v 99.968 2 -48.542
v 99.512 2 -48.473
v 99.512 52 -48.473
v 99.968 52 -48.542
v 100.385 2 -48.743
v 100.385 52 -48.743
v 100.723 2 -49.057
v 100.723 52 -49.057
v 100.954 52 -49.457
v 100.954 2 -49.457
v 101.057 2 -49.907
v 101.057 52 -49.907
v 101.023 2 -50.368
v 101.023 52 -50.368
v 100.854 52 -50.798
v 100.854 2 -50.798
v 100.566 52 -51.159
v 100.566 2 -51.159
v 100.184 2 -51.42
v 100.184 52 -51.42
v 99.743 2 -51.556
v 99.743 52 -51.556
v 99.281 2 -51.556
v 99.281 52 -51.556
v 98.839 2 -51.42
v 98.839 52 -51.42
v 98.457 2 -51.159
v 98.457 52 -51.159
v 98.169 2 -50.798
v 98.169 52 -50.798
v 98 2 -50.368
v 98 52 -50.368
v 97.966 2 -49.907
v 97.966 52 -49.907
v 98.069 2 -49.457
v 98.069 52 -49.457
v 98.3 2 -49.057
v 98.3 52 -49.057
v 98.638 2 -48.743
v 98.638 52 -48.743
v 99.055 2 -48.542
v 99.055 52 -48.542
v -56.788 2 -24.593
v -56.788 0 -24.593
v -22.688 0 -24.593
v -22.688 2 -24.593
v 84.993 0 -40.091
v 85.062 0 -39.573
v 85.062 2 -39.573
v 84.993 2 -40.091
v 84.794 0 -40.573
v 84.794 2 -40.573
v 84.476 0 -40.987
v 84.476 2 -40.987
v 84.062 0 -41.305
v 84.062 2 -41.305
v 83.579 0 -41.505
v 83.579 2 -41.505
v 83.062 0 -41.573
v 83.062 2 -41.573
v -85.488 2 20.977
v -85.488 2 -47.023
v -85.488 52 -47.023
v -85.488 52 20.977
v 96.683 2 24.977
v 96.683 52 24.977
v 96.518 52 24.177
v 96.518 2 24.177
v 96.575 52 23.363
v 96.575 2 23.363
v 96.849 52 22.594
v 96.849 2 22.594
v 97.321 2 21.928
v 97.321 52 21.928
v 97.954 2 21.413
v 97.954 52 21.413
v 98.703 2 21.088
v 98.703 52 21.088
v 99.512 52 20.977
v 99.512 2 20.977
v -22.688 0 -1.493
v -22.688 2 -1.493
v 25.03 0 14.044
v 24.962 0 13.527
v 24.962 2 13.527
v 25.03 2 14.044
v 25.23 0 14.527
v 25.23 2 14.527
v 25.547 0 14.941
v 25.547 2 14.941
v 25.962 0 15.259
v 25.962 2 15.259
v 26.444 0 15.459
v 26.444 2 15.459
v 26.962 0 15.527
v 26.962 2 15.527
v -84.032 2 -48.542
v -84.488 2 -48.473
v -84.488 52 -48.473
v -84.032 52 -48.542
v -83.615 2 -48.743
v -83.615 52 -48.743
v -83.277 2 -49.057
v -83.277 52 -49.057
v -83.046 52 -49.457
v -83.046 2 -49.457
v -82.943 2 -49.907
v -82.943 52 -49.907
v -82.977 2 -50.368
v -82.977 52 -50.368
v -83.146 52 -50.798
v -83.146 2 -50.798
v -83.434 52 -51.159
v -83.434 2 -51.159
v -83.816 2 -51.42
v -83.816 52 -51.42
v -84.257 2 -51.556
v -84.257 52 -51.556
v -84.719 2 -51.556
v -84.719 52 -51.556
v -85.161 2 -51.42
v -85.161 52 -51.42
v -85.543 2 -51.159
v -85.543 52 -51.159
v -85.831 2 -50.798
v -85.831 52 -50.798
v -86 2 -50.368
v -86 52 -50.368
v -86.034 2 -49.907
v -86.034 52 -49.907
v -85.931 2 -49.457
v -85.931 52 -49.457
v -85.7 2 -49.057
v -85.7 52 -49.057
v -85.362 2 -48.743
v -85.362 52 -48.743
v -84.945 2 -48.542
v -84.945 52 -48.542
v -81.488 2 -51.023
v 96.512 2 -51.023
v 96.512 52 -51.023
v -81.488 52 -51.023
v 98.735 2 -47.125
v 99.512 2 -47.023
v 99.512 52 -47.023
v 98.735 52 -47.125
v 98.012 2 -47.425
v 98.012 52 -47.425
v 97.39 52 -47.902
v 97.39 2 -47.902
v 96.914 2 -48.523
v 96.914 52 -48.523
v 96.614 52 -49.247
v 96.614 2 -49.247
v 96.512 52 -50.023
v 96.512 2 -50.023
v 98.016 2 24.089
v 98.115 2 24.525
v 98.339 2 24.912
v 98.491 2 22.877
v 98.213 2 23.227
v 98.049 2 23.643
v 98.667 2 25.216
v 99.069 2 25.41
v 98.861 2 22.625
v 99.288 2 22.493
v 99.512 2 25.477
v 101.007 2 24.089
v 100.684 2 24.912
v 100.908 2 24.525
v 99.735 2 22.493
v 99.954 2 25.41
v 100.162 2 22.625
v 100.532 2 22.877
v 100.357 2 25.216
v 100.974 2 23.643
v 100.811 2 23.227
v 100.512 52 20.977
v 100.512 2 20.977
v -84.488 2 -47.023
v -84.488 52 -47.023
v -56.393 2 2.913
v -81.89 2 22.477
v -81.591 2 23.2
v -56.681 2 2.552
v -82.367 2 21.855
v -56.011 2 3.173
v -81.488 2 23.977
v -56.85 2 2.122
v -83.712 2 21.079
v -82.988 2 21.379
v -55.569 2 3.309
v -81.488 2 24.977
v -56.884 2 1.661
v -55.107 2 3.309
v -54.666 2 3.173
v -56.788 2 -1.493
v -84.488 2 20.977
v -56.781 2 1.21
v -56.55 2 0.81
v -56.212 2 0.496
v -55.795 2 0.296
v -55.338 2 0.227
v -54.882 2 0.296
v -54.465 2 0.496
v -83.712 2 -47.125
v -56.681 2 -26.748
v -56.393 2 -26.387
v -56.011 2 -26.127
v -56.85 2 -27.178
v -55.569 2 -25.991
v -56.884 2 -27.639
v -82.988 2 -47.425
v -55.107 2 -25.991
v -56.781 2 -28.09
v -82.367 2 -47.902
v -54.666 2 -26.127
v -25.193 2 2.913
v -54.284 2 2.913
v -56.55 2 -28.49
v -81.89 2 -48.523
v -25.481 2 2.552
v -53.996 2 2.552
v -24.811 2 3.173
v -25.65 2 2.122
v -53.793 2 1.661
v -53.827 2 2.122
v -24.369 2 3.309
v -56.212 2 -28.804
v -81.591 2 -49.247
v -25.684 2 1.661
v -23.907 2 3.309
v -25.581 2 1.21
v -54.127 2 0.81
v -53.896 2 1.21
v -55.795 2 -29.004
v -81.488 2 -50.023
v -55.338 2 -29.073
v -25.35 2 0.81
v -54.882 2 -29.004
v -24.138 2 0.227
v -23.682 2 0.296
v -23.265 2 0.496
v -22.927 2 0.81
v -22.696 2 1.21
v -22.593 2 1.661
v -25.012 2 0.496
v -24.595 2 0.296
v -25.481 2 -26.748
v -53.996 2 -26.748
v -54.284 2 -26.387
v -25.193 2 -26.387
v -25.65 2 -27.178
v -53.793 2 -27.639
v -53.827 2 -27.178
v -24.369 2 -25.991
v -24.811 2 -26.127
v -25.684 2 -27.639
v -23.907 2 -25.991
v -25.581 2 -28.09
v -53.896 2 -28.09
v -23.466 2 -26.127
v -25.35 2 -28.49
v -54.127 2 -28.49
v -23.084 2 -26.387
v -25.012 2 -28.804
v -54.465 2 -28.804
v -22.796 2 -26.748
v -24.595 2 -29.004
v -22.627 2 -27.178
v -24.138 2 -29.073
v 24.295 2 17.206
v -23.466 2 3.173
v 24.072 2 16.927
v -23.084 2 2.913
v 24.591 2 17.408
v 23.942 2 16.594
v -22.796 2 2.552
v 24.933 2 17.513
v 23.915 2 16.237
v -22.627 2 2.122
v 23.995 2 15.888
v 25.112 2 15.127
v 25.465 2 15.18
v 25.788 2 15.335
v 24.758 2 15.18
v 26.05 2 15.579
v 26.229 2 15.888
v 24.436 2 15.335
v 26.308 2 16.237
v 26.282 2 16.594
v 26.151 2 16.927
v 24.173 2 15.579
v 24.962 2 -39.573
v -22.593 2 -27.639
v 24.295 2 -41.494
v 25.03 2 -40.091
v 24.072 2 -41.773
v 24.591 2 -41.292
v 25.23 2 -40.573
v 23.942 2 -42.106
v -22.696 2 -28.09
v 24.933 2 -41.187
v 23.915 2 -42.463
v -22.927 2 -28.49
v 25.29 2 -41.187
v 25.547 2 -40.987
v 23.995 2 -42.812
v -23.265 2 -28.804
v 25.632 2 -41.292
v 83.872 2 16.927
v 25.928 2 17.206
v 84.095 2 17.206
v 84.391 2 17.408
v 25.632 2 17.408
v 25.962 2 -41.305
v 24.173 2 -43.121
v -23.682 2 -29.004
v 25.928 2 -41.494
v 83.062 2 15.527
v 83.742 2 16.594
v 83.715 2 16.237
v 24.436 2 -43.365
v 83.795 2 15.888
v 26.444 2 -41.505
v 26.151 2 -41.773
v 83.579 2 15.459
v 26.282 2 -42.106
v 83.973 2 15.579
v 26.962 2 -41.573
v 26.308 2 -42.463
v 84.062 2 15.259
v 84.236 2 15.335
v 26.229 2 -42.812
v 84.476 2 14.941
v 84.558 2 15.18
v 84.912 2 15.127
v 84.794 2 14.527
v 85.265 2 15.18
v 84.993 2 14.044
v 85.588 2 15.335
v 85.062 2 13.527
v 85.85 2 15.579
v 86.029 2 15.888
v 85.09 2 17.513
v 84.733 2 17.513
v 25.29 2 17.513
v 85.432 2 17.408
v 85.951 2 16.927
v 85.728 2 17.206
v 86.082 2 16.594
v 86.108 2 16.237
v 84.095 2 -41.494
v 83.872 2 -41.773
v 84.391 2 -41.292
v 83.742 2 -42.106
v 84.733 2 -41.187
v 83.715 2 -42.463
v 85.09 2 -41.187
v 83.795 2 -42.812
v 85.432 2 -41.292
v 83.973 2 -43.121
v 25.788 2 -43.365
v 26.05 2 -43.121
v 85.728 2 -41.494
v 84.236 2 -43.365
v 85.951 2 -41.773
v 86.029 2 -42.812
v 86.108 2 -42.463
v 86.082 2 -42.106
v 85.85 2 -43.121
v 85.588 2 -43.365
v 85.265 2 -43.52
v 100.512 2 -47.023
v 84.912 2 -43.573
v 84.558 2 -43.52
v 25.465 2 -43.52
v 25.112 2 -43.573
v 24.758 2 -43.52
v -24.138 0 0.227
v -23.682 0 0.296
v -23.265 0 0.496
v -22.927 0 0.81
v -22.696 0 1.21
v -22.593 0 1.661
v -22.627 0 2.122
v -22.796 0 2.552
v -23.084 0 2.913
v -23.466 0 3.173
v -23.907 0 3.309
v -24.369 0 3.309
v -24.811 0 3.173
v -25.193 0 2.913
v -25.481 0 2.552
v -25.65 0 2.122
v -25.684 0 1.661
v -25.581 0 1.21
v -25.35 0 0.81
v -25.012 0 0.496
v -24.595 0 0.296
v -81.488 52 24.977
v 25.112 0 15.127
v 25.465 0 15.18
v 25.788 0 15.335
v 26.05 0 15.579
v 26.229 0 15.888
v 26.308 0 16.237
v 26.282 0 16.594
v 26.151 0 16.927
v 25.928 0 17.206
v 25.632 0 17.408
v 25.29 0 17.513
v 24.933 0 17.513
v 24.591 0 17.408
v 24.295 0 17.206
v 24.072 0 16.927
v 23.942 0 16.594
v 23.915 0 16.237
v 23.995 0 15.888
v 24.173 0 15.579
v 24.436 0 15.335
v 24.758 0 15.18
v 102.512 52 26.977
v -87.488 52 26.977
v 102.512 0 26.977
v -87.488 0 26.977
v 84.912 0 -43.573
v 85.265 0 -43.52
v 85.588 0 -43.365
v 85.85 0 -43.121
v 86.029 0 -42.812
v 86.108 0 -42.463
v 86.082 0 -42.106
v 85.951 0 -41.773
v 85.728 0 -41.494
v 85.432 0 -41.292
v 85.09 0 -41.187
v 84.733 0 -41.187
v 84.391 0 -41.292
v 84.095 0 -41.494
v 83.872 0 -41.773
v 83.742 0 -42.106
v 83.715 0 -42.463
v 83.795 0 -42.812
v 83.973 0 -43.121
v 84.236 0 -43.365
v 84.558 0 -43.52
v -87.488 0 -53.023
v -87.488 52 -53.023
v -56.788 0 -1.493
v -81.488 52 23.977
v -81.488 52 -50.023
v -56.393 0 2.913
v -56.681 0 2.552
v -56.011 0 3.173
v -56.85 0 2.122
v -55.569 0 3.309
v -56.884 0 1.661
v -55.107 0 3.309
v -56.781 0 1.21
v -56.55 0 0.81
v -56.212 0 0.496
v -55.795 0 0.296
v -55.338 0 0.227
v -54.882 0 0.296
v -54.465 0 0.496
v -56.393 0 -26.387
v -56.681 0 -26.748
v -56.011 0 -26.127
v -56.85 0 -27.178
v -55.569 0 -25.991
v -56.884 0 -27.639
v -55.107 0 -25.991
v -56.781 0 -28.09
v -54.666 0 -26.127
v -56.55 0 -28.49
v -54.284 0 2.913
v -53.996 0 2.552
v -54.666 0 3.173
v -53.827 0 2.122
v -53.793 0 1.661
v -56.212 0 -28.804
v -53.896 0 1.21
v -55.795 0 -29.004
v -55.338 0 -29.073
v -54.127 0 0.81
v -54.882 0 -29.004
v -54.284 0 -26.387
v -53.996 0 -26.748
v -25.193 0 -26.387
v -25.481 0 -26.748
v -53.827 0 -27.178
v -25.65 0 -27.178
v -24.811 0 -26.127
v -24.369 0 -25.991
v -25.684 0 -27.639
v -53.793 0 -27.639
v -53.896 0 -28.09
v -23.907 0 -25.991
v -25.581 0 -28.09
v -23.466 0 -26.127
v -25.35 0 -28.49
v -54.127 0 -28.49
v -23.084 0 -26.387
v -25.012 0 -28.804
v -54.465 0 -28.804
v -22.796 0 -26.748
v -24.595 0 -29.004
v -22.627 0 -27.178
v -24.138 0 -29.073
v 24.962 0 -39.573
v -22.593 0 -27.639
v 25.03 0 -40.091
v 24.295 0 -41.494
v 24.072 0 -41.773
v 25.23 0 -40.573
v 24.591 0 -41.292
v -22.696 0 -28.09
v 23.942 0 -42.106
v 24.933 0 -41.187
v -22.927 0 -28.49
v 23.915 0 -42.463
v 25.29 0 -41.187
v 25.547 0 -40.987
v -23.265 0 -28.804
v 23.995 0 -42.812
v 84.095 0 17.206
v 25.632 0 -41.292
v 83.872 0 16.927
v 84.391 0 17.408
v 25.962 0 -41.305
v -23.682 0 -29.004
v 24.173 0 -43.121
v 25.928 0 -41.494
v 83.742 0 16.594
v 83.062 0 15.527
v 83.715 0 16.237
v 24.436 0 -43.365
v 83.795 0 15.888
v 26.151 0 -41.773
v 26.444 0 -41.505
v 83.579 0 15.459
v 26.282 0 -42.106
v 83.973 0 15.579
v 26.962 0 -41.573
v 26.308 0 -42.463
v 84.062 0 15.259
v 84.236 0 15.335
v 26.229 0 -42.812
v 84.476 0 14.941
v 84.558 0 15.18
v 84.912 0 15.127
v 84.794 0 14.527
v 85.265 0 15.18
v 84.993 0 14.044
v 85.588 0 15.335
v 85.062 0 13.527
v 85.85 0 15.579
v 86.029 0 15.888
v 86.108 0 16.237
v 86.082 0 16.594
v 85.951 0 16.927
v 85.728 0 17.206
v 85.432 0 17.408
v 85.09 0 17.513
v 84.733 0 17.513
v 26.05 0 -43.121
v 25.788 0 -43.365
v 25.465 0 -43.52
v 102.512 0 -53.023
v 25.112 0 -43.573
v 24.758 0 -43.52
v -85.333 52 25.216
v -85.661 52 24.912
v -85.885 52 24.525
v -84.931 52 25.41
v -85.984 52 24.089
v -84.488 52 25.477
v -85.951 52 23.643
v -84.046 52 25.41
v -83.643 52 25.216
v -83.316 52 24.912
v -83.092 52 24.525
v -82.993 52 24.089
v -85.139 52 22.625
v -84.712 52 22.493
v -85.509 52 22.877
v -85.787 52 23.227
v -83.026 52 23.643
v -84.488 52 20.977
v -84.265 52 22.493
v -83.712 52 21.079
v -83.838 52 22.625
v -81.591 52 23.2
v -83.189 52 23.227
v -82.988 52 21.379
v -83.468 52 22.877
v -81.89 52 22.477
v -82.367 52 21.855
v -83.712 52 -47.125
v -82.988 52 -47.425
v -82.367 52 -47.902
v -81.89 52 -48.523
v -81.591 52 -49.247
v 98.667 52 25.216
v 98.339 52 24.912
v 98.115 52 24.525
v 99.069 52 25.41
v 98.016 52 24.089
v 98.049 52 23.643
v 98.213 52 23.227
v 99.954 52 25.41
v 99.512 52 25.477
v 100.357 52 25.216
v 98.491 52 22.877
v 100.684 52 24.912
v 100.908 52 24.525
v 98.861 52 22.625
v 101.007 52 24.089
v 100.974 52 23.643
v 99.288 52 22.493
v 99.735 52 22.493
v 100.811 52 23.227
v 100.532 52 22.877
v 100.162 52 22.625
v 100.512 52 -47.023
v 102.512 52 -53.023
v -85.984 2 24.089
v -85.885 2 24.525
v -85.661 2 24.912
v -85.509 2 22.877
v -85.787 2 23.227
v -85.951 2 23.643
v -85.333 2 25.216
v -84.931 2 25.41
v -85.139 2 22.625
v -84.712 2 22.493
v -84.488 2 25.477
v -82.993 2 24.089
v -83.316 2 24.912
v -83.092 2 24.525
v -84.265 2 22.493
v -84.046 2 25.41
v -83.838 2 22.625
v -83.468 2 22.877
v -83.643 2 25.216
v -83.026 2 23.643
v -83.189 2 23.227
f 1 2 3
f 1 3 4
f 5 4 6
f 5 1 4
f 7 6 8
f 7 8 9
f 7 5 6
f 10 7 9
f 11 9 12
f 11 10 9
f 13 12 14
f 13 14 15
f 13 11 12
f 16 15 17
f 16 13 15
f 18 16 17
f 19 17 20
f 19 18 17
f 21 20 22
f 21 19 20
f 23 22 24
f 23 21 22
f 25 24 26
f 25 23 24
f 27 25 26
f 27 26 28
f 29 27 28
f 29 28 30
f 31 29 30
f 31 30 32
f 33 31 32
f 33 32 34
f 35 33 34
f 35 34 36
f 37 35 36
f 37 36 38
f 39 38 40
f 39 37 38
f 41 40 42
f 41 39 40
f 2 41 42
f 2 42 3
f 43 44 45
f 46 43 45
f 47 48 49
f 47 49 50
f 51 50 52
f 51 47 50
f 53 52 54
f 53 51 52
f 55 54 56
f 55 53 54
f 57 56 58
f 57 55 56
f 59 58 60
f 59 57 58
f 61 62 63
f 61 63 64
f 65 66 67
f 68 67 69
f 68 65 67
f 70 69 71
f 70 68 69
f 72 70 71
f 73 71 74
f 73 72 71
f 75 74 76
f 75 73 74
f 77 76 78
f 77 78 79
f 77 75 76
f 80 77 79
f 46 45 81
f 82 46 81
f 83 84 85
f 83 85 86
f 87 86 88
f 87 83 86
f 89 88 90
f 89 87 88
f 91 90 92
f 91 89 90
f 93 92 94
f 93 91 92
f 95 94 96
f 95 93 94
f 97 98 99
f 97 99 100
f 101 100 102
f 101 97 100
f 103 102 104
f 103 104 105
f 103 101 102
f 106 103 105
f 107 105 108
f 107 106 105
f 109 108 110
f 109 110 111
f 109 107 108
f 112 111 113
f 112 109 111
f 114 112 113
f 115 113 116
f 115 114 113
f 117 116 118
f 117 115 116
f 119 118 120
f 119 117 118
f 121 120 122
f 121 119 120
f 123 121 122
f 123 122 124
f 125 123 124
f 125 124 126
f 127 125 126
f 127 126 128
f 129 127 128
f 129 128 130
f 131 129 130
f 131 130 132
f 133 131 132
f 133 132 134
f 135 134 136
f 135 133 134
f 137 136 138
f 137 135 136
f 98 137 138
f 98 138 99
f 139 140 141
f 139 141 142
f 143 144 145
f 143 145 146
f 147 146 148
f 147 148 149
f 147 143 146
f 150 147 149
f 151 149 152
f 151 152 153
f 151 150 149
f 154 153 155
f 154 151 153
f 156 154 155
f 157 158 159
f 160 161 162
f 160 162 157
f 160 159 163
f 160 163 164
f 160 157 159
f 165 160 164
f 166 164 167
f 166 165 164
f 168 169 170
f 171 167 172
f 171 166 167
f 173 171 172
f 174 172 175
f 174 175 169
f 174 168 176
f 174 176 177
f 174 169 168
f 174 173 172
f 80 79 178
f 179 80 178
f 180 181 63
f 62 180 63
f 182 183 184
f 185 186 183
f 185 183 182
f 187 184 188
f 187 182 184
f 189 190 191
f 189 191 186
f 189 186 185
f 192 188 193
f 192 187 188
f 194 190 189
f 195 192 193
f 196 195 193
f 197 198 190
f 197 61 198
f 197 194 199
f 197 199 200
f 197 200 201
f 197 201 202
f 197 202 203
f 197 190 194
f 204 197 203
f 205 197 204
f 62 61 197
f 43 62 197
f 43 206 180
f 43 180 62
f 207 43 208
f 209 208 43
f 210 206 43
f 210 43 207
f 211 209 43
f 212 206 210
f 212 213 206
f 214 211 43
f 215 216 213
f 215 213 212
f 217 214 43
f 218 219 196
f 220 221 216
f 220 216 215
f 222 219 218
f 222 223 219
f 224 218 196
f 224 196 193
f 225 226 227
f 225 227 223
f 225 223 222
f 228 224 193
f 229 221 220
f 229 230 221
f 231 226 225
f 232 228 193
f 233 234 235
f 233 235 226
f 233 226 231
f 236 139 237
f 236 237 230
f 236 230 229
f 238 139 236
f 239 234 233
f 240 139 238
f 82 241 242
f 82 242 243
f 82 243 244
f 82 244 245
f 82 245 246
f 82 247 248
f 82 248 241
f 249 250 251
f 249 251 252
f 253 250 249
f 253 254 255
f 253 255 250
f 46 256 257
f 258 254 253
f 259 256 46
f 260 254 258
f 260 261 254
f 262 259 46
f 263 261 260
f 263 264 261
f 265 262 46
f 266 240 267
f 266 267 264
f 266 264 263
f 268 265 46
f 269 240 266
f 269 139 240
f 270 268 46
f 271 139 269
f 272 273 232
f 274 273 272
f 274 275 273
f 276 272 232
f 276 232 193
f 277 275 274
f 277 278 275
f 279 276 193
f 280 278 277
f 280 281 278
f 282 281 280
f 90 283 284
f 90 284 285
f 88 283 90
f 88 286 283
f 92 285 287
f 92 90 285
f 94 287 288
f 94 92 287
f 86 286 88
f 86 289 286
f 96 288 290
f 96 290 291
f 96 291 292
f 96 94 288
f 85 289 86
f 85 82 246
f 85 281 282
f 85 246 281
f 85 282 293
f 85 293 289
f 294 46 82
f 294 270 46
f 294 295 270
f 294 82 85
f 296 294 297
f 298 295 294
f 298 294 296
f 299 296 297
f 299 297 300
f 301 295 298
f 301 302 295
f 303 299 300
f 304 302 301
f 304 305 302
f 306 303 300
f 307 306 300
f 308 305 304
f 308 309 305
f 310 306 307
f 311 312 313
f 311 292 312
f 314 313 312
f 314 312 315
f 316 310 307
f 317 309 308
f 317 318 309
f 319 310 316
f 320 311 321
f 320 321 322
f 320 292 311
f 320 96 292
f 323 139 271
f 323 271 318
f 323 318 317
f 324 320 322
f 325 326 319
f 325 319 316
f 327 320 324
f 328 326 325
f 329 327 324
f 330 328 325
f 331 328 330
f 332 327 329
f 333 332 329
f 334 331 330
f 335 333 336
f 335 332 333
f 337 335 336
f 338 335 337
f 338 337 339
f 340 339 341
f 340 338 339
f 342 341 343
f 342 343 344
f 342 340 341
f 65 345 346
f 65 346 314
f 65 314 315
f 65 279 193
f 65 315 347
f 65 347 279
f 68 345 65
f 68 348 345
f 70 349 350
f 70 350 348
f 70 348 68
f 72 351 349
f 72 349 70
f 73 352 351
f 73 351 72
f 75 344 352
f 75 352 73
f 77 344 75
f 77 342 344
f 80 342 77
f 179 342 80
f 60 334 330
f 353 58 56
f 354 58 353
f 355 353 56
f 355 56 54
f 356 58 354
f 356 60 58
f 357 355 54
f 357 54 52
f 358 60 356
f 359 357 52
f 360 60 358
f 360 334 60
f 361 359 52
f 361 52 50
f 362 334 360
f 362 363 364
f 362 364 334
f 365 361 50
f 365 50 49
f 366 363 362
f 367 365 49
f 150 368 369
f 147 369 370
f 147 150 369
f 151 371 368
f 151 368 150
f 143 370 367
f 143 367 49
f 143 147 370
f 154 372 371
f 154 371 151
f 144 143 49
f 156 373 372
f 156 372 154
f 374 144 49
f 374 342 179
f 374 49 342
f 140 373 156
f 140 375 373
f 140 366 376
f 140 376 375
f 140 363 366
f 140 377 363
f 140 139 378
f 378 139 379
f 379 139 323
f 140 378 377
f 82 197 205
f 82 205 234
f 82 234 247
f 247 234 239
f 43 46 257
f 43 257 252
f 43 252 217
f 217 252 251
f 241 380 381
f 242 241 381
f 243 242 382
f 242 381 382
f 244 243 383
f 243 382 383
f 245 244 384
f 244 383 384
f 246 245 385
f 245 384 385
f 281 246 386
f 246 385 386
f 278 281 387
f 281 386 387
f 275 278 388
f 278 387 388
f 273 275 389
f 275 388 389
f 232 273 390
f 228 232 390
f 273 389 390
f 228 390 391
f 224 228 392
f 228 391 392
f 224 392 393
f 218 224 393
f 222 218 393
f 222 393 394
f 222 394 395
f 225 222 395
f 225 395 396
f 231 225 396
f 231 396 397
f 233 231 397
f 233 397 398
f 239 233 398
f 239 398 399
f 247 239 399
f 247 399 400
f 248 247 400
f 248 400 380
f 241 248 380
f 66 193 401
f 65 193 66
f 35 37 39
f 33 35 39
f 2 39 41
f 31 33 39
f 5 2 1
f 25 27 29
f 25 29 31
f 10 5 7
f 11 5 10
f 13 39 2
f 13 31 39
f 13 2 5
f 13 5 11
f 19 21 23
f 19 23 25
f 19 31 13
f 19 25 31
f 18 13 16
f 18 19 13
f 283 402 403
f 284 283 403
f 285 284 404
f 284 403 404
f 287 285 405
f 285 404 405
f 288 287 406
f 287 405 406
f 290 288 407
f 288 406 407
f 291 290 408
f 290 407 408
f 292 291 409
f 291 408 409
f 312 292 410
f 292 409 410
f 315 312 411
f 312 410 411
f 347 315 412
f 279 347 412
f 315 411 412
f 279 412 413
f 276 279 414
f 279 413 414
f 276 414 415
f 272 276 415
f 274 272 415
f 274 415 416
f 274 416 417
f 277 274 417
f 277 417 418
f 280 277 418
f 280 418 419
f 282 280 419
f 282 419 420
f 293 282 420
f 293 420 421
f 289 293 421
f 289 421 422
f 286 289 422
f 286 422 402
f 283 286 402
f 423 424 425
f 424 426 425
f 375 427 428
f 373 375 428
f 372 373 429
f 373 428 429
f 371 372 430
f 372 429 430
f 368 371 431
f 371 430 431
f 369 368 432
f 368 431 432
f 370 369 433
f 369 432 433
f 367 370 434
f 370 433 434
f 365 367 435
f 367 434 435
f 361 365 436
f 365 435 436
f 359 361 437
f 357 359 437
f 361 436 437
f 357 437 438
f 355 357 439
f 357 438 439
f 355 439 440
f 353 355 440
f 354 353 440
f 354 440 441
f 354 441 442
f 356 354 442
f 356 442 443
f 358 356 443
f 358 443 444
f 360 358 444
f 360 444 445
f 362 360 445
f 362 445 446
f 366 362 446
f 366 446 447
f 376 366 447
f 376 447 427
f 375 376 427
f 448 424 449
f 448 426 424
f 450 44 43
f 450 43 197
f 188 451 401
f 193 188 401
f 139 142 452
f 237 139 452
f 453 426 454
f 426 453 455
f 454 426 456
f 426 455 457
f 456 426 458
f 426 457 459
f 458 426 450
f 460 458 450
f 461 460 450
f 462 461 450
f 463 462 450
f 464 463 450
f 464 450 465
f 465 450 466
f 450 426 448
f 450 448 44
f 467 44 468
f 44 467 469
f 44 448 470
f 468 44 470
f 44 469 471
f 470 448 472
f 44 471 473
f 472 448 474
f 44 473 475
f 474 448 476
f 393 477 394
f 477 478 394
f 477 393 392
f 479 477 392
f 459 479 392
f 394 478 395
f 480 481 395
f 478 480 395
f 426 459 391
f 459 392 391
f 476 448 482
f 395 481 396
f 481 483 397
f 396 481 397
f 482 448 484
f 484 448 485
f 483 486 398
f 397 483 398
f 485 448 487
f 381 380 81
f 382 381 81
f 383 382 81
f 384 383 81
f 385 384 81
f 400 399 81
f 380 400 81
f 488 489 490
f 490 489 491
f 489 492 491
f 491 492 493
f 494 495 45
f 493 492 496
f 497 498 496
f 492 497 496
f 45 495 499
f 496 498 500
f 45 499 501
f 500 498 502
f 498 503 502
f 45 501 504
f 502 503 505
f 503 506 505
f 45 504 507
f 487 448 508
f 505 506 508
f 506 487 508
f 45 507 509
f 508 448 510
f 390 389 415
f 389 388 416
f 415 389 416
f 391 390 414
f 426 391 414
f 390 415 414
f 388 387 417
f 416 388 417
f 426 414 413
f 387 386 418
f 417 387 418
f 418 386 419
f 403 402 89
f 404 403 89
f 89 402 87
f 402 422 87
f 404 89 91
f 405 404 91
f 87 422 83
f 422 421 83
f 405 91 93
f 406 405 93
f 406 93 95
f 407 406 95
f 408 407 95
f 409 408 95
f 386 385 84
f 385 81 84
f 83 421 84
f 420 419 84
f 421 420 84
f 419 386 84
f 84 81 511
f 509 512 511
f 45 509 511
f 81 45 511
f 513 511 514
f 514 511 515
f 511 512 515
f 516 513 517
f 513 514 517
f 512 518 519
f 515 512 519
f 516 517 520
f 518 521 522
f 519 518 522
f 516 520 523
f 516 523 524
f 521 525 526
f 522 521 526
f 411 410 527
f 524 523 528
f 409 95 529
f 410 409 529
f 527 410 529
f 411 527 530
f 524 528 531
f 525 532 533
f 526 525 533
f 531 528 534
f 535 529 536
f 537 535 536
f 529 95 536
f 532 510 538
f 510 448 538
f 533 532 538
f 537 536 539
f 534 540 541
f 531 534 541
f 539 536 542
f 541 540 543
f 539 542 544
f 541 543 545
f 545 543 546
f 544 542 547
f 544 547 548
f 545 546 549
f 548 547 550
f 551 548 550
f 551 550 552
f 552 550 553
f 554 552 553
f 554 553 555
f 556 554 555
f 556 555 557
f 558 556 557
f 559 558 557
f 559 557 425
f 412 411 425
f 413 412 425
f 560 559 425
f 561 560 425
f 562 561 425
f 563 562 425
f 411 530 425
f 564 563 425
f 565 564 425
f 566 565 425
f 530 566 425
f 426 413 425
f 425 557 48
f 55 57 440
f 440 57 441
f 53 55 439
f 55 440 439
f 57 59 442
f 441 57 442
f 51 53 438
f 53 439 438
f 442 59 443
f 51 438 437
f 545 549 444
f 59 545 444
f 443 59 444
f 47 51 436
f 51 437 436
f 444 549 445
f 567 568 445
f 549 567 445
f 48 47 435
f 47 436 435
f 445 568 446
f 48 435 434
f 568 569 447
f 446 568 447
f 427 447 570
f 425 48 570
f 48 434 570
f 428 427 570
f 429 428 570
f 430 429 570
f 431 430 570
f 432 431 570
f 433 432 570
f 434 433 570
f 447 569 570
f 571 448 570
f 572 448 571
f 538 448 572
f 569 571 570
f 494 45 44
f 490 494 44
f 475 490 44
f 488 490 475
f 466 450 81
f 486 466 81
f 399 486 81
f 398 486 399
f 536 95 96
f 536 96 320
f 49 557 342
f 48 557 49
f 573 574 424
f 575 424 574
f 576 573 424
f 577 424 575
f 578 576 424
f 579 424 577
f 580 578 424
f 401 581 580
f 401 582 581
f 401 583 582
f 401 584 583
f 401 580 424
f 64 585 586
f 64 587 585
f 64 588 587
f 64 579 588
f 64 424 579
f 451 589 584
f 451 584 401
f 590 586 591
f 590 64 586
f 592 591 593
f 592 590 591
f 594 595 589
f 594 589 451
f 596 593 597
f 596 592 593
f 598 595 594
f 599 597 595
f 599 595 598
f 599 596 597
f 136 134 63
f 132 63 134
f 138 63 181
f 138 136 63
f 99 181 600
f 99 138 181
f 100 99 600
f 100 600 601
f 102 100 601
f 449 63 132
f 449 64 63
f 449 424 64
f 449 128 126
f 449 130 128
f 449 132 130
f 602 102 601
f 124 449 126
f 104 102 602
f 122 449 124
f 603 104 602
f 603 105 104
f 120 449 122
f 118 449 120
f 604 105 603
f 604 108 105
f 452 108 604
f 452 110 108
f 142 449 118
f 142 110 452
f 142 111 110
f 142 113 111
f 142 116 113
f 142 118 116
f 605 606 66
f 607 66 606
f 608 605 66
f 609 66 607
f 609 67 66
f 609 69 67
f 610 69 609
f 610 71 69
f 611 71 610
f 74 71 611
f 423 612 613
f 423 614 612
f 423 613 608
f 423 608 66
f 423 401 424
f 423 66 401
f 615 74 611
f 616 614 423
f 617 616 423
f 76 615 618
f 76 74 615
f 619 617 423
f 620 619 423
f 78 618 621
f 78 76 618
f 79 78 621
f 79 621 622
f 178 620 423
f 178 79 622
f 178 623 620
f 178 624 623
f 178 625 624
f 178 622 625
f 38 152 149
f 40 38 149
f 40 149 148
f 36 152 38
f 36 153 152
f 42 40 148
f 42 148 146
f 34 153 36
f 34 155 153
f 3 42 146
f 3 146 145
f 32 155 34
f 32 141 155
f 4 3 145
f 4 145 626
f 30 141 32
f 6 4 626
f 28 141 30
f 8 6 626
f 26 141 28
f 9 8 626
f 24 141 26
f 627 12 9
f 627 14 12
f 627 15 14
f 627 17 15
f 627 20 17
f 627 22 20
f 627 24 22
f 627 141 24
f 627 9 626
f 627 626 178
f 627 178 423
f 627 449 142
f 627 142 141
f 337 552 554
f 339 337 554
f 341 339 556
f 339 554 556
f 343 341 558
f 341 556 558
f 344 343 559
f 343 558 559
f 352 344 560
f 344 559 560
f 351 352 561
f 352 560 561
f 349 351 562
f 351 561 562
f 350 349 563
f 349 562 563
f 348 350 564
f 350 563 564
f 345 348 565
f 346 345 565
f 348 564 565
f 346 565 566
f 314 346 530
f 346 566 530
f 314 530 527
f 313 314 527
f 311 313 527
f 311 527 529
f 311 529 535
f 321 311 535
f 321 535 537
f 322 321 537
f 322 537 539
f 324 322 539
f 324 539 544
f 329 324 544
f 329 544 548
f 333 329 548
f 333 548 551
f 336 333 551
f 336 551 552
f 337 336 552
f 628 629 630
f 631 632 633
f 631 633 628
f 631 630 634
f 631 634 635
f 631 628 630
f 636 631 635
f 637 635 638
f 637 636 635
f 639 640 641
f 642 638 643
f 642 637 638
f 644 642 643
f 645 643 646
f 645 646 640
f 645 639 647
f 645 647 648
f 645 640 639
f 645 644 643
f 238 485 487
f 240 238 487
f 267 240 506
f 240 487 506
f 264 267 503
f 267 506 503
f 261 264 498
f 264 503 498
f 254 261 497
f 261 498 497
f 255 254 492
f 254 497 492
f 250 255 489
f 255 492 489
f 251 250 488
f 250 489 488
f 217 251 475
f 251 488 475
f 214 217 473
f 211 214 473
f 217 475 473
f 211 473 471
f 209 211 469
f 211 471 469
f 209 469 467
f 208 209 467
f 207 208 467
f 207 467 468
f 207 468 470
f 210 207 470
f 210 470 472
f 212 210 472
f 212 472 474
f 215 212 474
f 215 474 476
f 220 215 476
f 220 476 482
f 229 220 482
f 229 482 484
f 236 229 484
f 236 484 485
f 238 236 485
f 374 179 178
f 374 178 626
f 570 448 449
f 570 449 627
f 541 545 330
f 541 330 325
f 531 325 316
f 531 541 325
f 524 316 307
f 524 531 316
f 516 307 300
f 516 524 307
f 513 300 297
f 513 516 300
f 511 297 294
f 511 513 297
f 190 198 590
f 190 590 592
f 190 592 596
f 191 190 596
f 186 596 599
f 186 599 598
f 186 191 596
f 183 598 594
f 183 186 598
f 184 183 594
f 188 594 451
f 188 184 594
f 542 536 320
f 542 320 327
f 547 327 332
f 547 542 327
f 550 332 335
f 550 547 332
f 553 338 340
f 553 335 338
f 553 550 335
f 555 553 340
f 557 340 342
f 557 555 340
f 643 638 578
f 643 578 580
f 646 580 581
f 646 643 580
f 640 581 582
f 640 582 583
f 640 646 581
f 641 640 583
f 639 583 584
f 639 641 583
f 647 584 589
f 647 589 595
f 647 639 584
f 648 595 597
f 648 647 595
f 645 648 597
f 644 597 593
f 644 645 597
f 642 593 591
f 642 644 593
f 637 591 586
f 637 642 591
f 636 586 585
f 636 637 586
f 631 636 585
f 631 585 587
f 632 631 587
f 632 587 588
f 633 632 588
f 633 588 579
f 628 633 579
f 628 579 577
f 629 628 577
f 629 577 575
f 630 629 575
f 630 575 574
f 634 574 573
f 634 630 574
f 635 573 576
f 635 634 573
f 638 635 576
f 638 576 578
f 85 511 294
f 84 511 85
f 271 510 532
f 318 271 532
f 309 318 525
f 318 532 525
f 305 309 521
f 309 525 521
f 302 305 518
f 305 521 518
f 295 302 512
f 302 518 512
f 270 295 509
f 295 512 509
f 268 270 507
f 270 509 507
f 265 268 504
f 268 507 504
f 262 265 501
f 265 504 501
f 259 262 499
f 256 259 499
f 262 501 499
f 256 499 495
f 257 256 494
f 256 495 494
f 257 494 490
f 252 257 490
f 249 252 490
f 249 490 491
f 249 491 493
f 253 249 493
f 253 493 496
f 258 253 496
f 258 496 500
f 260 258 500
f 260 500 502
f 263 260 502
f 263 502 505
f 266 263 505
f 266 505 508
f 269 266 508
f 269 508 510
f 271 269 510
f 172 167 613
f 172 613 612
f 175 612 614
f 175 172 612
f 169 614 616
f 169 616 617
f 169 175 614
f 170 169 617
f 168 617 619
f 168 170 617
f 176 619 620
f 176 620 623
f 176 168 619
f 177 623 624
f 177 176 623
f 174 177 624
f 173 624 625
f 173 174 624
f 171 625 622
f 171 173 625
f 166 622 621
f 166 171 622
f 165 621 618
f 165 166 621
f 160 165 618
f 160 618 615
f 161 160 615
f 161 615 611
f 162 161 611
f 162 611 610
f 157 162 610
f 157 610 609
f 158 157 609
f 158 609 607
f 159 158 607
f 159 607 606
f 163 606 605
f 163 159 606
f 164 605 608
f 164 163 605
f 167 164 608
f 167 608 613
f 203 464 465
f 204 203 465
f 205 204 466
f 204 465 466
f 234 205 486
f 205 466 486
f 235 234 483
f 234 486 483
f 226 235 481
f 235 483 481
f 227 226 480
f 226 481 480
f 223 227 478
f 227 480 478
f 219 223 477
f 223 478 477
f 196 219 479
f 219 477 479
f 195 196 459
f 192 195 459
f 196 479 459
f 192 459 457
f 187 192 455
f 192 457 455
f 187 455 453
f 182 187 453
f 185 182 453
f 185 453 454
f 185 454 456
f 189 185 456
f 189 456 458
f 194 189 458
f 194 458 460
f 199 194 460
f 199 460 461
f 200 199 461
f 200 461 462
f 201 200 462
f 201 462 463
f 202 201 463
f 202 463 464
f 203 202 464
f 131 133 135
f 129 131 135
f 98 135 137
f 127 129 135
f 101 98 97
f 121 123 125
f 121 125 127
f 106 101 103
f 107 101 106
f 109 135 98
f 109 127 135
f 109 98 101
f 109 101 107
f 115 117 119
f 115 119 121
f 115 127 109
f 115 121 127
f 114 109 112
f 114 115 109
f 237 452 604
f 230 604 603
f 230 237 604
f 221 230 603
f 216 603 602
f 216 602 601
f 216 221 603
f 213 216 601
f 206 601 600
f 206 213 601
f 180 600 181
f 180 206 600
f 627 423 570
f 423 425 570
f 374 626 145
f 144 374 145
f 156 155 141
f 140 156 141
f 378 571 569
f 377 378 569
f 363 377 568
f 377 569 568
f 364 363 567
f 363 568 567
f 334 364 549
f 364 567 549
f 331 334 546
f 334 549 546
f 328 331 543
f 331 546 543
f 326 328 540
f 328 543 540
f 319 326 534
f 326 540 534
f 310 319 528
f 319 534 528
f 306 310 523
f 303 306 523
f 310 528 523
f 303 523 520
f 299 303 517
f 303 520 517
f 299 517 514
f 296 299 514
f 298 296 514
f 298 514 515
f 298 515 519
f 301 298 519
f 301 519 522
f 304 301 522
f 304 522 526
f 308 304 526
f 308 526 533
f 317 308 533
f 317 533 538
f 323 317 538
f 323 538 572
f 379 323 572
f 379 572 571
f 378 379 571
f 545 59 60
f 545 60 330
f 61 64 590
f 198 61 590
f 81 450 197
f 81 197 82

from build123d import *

# Parameters (mm, degrees)
SKETCH1_W           = 190
SKETCH1_H           = 80
BOSS_EXTRUDE1_DEPTH = 2
SKETCH2_W           = 190
SKETCH2_H           = 80
SKETCH2_R           = 1.5
SKETCH2_R_2         = 1.55
BOSS_EXTRUDE2_DEPTH = 50
SKETCH3_R           = 1.2
SKETCH3_R_2         = 1.55
SKETCH3_W           = 34.1
SKETCH3_H           = 23.1
CUT_EXTRUDE1_DEPTH  = 127.586332253


with BuildPart() as part:
    # Sketch1 → Boss-Extrude1 (new body)
    with BuildSketch(Plane(origin=(0, 0, 0), x_dir=(1, 0, 0), z_dir=(0, 1, 0))):
        with Locations((7.511627907, 13.023255814)):
            Rectangle(SKETCH1_W, SKETCH1_H)
    extrude(amount=BOSS_EXTRUDE1_DEPTH)

    # Sketch2 → Boss-Extrude2 (add)
    with BuildSketch(Plane(origin=(0, 2, 0), x_dir=(1, 0, 0), z_dir=(0, 1, 0))):
        with Locations((7.511627907, 13.023255814)):
            Rectangle(SKETCH2_W, SKETCH2_H)
        with Locations(Location((-84.488372093, -23.976744186, 0), (0, 0, 270))):
            Circle(SKETCH2_R, mode=Mode.SUBTRACT)
        with Locations(Location((99.511627907, -23.976744186, 0), (0, 0, 270))):
            Circle(SKETCH2_R, mode=Mode.SUBTRACT)
        with Locations(Location((99.511627907, 50.023255814, 0), (0, 0, 270))):
            Circle(SKETCH2_R_2, mode=Mode.SUBTRACT)
        with Locations(Location((-84.488372093, 50.023255814, 0), (0, 0, 270))):
            Circle(SKETCH2_R_2, mode=Mode.SUBTRACT)
        with BuildLine():
            Line((-81.488372093, -23.976744186), (-81.488372093, -24.976744186))
            Line((-81.488372093, -24.976744186), (96.683200782, -24.976744186))
            ThreePointArc((96.683200782, -24.976744186), (97.062138164, -22.244693378), (99.511627907, -20.976744186))
            Line((99.511627907, -20.976744186), (100.511627907, -20.976744186))
            Line((100.511627907, -20.976744186), (100.511627907, 47.023255814))
            Line((100.511627907, 47.023255814), (99.511627907, 47.023255814))
            ThreePointArc((99.511627907, 47.023255814), (97.390307563, 47.90193547), (96.511627907, 50.023255814))
            Line((96.511627907, 50.023255814), (96.511627907, 51.023255814))
            Line((96.511627907, 51.023255814), (-81.488372093, 51.023255814))
            Line((-81.488372093, 51.023255814), (-81.488372093, 50.023255814))
            ThreePointArc((-81.488372093, 50.023255814), (-82.367051749, 47.90193547), (-84.488372093, 47.023255814))
            Line((-84.488372093, 47.023255814), (-85.488372093, 47.023255814))
            Line((-85.488372093, 47.023255814), (-85.488372093, -20.976744186))
            Line((-85.488372093, -20.976744186), (-84.488372093, -20.976744186))
            ThreePointArc((-84.488372093, -20.976744186), (-82.367051749, -21.855423842), (-81.488372093, -23.976744186))
        make_face(mode=Mode.SUBTRACT)
    extrude(amount=BOSS_EXTRUDE2_DEPTH)

    # Sketch3 → Cut-Extrude1 (cut, through all)
    with BuildSketch(Plane.XZ):
        with Locations(Location((25.111627907, 16.326744186, 0), (0, 0, 270))):
            Circle(SKETCH3_R)
        with Locations(Location((84.911627907, 16.326744186, 0), (0, 0, 270))):
            Circle(SKETCH3_R)
        with Locations(Location((25.111627907, -42.373255814, 0), (0, 0, 270))):
            Circle(SKETCH3_R)
        with Locations(Location((84.911627907, -42.373255814, 0), (0, 0, 270))):
            Circle(SKETCH3_R)
        with Locations(Location((-55.338372093, 1.776744186, 0), (0, 0, 270))):
            Circle(SKETCH3_R_2)
        with Locations(Location((-24.138372093, 1.776744186, 0), (0, 0, 270))):
            Circle(SKETCH3_R_2)
        with Locations(Location((-55.338372093, -27.523255814, 0), (0, 0, 270))):
            Circle(SKETCH3_R_2)
        with Locations(Location((-24.138372093, -27.523255814, 0), (0, 0, 270))):
            Circle(SKETCH3_R_2)
        with BuildLine():
            Line((26.961627907, 15.526744186), (83.061627907, 15.526744186))
            ThreePointArc((83.061627907, 15.526744186), (84.475841469, 14.940957748), (85.061627907, 13.526744186))
            Line((85.061627907, 13.526744186), (85.061627907, -39.573255814))
            ThreePointArc((85.061627907, -39.573255814), (84.475841469, -40.987469376), (83.061627907, -41.573255814))
            Line((83.061627907, -41.573255814), (26.961627907, -41.573255814))
            ThreePointArc((26.961627907, -41.573255814), (25.547414345, -40.987469376), (24.961627907, -39.573255814))
            Line((24.961627907, -39.573255814), (24.961627907, 13.526744186))
            ThreePointArc((24.961627907, 13.526744186), (25.547414345, 14.940957748), (26.961627907, 15.526744186))
        make_face()
        with Locations((-39.738372093, -13.043255814)):
            Rectangle(SKETCH3_W, SKETCH3_H)
    extrude(amount=-CUT_EXTRUDE1_DEPTH, mode=Mode.SUBTRACT)


solid = part.part
